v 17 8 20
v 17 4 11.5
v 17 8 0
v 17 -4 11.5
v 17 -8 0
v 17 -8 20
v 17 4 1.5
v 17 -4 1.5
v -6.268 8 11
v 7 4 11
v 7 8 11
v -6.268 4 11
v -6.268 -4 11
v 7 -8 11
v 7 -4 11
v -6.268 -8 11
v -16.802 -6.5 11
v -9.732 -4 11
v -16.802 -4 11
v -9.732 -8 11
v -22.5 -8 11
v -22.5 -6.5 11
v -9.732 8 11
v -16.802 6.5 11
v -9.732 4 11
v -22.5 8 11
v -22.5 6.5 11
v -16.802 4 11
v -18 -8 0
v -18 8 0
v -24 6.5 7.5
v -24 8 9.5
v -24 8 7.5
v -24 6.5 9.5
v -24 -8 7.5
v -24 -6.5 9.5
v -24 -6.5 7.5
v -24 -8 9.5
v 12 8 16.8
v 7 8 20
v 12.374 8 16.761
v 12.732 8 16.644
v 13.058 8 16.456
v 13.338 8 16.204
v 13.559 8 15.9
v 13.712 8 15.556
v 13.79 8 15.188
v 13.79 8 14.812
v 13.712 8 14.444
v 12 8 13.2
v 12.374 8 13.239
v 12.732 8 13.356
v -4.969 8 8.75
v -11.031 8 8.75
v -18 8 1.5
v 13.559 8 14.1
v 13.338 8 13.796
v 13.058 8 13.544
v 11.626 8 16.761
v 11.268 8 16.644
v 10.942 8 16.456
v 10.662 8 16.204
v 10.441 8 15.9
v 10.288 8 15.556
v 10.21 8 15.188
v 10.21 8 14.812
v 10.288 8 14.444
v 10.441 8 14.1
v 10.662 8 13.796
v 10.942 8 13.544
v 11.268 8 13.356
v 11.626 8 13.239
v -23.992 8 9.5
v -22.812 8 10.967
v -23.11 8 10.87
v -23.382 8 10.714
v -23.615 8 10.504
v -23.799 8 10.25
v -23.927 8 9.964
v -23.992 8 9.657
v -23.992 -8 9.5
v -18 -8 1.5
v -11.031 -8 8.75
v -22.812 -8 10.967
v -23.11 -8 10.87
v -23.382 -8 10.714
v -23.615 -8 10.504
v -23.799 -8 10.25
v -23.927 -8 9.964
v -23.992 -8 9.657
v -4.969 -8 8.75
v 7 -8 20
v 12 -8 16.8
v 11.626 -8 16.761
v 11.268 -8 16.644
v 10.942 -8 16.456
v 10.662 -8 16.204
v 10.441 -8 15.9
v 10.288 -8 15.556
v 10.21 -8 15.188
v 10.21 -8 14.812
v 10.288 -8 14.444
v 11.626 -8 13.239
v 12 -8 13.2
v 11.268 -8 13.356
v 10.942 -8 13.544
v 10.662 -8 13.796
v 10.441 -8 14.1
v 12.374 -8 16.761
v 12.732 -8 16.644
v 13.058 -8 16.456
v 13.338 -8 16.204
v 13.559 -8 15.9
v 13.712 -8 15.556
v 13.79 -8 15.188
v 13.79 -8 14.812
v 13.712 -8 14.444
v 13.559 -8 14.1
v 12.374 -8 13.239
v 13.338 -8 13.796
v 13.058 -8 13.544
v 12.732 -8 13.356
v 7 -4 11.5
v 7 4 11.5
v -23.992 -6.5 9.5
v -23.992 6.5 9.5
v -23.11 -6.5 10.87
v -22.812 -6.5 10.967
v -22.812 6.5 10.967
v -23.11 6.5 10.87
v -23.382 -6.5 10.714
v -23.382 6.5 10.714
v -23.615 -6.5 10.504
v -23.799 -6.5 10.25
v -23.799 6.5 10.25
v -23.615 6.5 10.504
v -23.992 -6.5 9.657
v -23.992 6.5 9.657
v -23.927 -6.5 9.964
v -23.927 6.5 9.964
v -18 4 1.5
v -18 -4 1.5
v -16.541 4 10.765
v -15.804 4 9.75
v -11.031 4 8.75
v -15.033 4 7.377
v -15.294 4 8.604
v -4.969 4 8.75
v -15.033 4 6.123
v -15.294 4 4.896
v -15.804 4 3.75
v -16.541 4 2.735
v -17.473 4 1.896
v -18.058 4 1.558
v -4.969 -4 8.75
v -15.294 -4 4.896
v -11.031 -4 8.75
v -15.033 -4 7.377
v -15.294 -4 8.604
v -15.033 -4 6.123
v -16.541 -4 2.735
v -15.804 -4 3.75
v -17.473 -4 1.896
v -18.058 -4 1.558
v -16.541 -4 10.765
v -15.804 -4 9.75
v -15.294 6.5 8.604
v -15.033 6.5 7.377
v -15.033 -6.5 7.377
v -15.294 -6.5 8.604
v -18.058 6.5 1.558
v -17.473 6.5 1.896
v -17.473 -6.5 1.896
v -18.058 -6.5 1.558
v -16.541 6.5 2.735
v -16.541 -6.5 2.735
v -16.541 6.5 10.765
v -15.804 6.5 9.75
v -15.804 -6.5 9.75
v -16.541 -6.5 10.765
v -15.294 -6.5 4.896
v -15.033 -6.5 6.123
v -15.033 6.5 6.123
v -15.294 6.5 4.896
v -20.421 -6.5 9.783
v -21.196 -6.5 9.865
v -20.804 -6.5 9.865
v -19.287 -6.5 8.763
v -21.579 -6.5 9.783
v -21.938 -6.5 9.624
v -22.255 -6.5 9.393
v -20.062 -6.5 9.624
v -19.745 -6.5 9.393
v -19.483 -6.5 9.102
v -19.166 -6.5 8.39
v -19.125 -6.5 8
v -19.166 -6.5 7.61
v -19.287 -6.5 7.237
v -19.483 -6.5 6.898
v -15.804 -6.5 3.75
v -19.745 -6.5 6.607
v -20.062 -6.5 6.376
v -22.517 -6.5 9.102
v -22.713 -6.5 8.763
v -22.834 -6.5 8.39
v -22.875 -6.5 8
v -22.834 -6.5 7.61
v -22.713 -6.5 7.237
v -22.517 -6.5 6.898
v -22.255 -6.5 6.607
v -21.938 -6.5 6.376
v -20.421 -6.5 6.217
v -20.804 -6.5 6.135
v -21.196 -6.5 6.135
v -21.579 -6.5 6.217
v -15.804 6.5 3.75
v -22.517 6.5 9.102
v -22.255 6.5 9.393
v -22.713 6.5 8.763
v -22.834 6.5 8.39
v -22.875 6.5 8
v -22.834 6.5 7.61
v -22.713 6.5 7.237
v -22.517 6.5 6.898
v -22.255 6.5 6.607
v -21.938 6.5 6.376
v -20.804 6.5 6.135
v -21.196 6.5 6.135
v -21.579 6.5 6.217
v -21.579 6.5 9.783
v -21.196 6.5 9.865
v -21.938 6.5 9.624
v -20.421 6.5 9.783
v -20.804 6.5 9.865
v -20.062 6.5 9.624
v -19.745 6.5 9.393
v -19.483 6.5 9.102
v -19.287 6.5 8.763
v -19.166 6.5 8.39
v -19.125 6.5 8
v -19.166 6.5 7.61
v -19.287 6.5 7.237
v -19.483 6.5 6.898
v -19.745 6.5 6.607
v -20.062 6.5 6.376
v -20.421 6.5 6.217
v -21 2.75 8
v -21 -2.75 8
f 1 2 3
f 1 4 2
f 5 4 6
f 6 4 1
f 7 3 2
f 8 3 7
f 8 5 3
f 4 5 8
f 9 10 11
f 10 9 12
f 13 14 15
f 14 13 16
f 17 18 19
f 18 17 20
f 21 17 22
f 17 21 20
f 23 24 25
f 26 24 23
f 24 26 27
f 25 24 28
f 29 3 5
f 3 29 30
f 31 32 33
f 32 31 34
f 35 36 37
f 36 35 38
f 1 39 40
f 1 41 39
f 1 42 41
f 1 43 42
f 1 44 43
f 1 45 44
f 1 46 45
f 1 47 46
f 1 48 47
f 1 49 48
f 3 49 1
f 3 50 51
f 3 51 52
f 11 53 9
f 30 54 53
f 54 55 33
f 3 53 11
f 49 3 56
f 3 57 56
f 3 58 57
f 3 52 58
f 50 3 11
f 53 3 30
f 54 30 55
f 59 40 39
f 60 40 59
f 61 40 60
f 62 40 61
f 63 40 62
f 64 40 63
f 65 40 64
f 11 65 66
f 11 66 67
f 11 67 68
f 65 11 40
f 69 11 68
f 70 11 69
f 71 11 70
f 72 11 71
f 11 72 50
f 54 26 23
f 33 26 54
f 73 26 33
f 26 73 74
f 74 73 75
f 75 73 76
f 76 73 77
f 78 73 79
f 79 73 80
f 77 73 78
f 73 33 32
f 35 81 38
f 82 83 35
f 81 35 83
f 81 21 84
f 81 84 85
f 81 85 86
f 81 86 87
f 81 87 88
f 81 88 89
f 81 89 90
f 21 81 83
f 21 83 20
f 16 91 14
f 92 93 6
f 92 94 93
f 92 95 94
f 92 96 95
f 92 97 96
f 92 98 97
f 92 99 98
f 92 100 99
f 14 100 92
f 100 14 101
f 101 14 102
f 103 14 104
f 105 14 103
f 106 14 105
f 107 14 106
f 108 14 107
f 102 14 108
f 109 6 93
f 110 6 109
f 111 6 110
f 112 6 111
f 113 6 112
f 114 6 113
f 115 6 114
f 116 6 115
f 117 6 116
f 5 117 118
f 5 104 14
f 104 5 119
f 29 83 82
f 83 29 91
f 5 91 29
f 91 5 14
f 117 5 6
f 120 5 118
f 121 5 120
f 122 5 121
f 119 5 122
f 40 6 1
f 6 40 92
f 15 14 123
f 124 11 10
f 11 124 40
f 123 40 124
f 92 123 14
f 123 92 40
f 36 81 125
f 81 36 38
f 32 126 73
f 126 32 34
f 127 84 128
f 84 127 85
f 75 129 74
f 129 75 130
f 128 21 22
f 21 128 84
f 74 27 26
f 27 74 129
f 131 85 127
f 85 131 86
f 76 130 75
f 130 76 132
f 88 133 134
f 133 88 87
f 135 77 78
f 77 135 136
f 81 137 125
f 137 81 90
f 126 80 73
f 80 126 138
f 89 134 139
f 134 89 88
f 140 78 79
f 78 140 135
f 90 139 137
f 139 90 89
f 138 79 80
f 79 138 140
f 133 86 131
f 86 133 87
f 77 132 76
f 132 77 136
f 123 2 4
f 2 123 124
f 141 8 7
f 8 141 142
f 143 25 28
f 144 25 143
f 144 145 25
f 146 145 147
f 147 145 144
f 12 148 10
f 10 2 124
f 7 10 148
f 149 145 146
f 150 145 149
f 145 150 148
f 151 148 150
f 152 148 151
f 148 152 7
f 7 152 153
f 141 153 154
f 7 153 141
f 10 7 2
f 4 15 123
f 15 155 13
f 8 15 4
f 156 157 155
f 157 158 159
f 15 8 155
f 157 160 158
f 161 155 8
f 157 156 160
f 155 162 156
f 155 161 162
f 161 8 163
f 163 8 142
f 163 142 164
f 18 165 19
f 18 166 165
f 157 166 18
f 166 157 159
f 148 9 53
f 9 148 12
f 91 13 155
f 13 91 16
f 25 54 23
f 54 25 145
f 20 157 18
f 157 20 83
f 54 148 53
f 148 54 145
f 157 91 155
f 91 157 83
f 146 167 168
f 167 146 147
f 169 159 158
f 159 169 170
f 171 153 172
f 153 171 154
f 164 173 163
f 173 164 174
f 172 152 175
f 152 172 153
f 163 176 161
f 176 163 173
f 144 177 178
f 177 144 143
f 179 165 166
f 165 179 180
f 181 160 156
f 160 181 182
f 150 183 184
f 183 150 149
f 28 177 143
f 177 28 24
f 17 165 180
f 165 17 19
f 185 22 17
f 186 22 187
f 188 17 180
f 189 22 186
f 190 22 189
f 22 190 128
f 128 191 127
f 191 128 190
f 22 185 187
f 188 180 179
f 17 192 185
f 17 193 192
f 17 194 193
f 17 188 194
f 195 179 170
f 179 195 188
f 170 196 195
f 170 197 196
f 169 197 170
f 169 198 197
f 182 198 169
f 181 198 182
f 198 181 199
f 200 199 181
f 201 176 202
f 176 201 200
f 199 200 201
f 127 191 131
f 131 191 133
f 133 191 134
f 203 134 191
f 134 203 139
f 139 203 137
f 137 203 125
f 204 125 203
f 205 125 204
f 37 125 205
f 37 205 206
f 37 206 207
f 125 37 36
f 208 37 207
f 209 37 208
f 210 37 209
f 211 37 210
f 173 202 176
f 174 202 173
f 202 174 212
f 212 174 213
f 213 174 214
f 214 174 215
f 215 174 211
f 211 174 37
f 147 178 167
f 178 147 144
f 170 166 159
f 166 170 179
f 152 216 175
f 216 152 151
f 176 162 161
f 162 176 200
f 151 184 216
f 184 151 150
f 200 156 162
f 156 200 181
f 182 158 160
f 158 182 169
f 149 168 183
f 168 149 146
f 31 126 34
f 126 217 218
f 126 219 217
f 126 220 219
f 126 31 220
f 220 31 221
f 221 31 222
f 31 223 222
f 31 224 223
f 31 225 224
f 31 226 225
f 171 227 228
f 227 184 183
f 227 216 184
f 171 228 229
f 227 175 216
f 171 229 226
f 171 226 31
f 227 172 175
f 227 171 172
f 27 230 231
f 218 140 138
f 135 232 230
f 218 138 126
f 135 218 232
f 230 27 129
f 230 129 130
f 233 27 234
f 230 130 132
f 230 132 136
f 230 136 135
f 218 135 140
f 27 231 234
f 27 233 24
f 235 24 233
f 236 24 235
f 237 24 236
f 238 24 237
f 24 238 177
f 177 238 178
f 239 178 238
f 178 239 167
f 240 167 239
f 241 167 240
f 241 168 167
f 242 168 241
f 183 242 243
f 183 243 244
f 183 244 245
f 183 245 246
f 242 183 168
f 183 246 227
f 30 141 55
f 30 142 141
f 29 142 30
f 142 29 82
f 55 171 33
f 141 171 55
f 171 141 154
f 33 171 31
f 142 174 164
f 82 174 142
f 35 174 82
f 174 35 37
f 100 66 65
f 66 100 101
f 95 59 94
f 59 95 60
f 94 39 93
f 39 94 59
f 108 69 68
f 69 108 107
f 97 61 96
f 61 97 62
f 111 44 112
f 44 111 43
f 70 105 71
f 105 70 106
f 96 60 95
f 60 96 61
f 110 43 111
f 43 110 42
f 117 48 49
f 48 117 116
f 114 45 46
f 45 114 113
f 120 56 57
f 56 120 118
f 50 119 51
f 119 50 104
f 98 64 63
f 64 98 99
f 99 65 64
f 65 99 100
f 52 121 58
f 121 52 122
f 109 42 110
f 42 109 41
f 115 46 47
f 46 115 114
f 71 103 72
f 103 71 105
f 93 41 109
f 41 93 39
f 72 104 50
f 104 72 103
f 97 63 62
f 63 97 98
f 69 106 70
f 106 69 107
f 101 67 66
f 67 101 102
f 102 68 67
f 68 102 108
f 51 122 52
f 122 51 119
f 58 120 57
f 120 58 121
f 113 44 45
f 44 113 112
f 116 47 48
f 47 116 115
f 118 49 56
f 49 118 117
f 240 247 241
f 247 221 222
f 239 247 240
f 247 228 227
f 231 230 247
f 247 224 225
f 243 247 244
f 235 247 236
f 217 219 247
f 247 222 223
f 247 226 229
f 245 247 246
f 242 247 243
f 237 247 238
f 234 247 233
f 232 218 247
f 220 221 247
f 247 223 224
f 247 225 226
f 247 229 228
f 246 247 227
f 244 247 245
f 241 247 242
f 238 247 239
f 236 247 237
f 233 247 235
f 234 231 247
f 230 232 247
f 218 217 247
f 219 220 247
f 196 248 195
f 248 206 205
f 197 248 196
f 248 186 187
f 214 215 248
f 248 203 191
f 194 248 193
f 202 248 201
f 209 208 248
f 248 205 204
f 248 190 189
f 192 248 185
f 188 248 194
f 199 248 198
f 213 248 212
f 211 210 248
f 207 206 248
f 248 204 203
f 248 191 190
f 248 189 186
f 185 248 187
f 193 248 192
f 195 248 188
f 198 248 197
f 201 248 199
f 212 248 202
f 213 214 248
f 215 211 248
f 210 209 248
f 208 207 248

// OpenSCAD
// In case you want to see the original for comparison purposes
module drag_chain_extruder_end_orig() {
    translate([-26,0,0]) {
        import_stl("EndCornerExtruder_optional.stl");
    }
}

module drag_chain_extruder_end() {
    translate([0,-8,0]) {
        difference () {
            union() {
                translate([-6,0,0]) cube([41,16,11]);
                // Tab
                translate([25,0,10]) cube([10,16,10]);
                //translate([-4.5, 16, 9.5]) rotate([90,-90,0]) cylinder(r=1.5, h=16, $fn=30);
            }
            union() {
                translate([-1, 4, 1.5]) cube([37,8,10]);
                translate([10, 25, 10.5]) rotate([90,-90,0]) cylinder(r=3.5, h=38, $fn=3);
                translate([-4.5, 17, 9.5]) { // rounded tops
                    difference() {
                        translate([-3, -18, 0]) cube([3, 18, 3]);
                        translate([0,1,0]) rotate([90,-90,0]) cylinder(r=1.5, h=20, $fn=30);
                    }
                }
                // Space around pivots
                translate([-3, 14.5, 6.75]) rotate([90,-90,0]) cylinder(r=6, h=13, $fn=30);

                translate([-7,-1,-1]) cube([7,19,2.5]);
                translate([0,-1,1.5]) rotate([0,-135,0]) cube([10,19,10]);

                // Tab
                translate([30, 25, 15]) rotate([90,-90,0]) cylinder(r=1.8, h=38, $fn=30);
            }
        }
        translate([-3,10.75, 8]) rotate([-90,0,0]) cylinder(r1=0, r2=2, h=4, $fn=30);
        translate([-3,5.25, 8]) rotate([90,0,0]) cylinder(r1=0, r2=2, h=4, $fn=30);
    }
}
//drag_chain_extruder_end_orig();
translate([-18,0,0]) 
  drag_chain_extruder_end();
